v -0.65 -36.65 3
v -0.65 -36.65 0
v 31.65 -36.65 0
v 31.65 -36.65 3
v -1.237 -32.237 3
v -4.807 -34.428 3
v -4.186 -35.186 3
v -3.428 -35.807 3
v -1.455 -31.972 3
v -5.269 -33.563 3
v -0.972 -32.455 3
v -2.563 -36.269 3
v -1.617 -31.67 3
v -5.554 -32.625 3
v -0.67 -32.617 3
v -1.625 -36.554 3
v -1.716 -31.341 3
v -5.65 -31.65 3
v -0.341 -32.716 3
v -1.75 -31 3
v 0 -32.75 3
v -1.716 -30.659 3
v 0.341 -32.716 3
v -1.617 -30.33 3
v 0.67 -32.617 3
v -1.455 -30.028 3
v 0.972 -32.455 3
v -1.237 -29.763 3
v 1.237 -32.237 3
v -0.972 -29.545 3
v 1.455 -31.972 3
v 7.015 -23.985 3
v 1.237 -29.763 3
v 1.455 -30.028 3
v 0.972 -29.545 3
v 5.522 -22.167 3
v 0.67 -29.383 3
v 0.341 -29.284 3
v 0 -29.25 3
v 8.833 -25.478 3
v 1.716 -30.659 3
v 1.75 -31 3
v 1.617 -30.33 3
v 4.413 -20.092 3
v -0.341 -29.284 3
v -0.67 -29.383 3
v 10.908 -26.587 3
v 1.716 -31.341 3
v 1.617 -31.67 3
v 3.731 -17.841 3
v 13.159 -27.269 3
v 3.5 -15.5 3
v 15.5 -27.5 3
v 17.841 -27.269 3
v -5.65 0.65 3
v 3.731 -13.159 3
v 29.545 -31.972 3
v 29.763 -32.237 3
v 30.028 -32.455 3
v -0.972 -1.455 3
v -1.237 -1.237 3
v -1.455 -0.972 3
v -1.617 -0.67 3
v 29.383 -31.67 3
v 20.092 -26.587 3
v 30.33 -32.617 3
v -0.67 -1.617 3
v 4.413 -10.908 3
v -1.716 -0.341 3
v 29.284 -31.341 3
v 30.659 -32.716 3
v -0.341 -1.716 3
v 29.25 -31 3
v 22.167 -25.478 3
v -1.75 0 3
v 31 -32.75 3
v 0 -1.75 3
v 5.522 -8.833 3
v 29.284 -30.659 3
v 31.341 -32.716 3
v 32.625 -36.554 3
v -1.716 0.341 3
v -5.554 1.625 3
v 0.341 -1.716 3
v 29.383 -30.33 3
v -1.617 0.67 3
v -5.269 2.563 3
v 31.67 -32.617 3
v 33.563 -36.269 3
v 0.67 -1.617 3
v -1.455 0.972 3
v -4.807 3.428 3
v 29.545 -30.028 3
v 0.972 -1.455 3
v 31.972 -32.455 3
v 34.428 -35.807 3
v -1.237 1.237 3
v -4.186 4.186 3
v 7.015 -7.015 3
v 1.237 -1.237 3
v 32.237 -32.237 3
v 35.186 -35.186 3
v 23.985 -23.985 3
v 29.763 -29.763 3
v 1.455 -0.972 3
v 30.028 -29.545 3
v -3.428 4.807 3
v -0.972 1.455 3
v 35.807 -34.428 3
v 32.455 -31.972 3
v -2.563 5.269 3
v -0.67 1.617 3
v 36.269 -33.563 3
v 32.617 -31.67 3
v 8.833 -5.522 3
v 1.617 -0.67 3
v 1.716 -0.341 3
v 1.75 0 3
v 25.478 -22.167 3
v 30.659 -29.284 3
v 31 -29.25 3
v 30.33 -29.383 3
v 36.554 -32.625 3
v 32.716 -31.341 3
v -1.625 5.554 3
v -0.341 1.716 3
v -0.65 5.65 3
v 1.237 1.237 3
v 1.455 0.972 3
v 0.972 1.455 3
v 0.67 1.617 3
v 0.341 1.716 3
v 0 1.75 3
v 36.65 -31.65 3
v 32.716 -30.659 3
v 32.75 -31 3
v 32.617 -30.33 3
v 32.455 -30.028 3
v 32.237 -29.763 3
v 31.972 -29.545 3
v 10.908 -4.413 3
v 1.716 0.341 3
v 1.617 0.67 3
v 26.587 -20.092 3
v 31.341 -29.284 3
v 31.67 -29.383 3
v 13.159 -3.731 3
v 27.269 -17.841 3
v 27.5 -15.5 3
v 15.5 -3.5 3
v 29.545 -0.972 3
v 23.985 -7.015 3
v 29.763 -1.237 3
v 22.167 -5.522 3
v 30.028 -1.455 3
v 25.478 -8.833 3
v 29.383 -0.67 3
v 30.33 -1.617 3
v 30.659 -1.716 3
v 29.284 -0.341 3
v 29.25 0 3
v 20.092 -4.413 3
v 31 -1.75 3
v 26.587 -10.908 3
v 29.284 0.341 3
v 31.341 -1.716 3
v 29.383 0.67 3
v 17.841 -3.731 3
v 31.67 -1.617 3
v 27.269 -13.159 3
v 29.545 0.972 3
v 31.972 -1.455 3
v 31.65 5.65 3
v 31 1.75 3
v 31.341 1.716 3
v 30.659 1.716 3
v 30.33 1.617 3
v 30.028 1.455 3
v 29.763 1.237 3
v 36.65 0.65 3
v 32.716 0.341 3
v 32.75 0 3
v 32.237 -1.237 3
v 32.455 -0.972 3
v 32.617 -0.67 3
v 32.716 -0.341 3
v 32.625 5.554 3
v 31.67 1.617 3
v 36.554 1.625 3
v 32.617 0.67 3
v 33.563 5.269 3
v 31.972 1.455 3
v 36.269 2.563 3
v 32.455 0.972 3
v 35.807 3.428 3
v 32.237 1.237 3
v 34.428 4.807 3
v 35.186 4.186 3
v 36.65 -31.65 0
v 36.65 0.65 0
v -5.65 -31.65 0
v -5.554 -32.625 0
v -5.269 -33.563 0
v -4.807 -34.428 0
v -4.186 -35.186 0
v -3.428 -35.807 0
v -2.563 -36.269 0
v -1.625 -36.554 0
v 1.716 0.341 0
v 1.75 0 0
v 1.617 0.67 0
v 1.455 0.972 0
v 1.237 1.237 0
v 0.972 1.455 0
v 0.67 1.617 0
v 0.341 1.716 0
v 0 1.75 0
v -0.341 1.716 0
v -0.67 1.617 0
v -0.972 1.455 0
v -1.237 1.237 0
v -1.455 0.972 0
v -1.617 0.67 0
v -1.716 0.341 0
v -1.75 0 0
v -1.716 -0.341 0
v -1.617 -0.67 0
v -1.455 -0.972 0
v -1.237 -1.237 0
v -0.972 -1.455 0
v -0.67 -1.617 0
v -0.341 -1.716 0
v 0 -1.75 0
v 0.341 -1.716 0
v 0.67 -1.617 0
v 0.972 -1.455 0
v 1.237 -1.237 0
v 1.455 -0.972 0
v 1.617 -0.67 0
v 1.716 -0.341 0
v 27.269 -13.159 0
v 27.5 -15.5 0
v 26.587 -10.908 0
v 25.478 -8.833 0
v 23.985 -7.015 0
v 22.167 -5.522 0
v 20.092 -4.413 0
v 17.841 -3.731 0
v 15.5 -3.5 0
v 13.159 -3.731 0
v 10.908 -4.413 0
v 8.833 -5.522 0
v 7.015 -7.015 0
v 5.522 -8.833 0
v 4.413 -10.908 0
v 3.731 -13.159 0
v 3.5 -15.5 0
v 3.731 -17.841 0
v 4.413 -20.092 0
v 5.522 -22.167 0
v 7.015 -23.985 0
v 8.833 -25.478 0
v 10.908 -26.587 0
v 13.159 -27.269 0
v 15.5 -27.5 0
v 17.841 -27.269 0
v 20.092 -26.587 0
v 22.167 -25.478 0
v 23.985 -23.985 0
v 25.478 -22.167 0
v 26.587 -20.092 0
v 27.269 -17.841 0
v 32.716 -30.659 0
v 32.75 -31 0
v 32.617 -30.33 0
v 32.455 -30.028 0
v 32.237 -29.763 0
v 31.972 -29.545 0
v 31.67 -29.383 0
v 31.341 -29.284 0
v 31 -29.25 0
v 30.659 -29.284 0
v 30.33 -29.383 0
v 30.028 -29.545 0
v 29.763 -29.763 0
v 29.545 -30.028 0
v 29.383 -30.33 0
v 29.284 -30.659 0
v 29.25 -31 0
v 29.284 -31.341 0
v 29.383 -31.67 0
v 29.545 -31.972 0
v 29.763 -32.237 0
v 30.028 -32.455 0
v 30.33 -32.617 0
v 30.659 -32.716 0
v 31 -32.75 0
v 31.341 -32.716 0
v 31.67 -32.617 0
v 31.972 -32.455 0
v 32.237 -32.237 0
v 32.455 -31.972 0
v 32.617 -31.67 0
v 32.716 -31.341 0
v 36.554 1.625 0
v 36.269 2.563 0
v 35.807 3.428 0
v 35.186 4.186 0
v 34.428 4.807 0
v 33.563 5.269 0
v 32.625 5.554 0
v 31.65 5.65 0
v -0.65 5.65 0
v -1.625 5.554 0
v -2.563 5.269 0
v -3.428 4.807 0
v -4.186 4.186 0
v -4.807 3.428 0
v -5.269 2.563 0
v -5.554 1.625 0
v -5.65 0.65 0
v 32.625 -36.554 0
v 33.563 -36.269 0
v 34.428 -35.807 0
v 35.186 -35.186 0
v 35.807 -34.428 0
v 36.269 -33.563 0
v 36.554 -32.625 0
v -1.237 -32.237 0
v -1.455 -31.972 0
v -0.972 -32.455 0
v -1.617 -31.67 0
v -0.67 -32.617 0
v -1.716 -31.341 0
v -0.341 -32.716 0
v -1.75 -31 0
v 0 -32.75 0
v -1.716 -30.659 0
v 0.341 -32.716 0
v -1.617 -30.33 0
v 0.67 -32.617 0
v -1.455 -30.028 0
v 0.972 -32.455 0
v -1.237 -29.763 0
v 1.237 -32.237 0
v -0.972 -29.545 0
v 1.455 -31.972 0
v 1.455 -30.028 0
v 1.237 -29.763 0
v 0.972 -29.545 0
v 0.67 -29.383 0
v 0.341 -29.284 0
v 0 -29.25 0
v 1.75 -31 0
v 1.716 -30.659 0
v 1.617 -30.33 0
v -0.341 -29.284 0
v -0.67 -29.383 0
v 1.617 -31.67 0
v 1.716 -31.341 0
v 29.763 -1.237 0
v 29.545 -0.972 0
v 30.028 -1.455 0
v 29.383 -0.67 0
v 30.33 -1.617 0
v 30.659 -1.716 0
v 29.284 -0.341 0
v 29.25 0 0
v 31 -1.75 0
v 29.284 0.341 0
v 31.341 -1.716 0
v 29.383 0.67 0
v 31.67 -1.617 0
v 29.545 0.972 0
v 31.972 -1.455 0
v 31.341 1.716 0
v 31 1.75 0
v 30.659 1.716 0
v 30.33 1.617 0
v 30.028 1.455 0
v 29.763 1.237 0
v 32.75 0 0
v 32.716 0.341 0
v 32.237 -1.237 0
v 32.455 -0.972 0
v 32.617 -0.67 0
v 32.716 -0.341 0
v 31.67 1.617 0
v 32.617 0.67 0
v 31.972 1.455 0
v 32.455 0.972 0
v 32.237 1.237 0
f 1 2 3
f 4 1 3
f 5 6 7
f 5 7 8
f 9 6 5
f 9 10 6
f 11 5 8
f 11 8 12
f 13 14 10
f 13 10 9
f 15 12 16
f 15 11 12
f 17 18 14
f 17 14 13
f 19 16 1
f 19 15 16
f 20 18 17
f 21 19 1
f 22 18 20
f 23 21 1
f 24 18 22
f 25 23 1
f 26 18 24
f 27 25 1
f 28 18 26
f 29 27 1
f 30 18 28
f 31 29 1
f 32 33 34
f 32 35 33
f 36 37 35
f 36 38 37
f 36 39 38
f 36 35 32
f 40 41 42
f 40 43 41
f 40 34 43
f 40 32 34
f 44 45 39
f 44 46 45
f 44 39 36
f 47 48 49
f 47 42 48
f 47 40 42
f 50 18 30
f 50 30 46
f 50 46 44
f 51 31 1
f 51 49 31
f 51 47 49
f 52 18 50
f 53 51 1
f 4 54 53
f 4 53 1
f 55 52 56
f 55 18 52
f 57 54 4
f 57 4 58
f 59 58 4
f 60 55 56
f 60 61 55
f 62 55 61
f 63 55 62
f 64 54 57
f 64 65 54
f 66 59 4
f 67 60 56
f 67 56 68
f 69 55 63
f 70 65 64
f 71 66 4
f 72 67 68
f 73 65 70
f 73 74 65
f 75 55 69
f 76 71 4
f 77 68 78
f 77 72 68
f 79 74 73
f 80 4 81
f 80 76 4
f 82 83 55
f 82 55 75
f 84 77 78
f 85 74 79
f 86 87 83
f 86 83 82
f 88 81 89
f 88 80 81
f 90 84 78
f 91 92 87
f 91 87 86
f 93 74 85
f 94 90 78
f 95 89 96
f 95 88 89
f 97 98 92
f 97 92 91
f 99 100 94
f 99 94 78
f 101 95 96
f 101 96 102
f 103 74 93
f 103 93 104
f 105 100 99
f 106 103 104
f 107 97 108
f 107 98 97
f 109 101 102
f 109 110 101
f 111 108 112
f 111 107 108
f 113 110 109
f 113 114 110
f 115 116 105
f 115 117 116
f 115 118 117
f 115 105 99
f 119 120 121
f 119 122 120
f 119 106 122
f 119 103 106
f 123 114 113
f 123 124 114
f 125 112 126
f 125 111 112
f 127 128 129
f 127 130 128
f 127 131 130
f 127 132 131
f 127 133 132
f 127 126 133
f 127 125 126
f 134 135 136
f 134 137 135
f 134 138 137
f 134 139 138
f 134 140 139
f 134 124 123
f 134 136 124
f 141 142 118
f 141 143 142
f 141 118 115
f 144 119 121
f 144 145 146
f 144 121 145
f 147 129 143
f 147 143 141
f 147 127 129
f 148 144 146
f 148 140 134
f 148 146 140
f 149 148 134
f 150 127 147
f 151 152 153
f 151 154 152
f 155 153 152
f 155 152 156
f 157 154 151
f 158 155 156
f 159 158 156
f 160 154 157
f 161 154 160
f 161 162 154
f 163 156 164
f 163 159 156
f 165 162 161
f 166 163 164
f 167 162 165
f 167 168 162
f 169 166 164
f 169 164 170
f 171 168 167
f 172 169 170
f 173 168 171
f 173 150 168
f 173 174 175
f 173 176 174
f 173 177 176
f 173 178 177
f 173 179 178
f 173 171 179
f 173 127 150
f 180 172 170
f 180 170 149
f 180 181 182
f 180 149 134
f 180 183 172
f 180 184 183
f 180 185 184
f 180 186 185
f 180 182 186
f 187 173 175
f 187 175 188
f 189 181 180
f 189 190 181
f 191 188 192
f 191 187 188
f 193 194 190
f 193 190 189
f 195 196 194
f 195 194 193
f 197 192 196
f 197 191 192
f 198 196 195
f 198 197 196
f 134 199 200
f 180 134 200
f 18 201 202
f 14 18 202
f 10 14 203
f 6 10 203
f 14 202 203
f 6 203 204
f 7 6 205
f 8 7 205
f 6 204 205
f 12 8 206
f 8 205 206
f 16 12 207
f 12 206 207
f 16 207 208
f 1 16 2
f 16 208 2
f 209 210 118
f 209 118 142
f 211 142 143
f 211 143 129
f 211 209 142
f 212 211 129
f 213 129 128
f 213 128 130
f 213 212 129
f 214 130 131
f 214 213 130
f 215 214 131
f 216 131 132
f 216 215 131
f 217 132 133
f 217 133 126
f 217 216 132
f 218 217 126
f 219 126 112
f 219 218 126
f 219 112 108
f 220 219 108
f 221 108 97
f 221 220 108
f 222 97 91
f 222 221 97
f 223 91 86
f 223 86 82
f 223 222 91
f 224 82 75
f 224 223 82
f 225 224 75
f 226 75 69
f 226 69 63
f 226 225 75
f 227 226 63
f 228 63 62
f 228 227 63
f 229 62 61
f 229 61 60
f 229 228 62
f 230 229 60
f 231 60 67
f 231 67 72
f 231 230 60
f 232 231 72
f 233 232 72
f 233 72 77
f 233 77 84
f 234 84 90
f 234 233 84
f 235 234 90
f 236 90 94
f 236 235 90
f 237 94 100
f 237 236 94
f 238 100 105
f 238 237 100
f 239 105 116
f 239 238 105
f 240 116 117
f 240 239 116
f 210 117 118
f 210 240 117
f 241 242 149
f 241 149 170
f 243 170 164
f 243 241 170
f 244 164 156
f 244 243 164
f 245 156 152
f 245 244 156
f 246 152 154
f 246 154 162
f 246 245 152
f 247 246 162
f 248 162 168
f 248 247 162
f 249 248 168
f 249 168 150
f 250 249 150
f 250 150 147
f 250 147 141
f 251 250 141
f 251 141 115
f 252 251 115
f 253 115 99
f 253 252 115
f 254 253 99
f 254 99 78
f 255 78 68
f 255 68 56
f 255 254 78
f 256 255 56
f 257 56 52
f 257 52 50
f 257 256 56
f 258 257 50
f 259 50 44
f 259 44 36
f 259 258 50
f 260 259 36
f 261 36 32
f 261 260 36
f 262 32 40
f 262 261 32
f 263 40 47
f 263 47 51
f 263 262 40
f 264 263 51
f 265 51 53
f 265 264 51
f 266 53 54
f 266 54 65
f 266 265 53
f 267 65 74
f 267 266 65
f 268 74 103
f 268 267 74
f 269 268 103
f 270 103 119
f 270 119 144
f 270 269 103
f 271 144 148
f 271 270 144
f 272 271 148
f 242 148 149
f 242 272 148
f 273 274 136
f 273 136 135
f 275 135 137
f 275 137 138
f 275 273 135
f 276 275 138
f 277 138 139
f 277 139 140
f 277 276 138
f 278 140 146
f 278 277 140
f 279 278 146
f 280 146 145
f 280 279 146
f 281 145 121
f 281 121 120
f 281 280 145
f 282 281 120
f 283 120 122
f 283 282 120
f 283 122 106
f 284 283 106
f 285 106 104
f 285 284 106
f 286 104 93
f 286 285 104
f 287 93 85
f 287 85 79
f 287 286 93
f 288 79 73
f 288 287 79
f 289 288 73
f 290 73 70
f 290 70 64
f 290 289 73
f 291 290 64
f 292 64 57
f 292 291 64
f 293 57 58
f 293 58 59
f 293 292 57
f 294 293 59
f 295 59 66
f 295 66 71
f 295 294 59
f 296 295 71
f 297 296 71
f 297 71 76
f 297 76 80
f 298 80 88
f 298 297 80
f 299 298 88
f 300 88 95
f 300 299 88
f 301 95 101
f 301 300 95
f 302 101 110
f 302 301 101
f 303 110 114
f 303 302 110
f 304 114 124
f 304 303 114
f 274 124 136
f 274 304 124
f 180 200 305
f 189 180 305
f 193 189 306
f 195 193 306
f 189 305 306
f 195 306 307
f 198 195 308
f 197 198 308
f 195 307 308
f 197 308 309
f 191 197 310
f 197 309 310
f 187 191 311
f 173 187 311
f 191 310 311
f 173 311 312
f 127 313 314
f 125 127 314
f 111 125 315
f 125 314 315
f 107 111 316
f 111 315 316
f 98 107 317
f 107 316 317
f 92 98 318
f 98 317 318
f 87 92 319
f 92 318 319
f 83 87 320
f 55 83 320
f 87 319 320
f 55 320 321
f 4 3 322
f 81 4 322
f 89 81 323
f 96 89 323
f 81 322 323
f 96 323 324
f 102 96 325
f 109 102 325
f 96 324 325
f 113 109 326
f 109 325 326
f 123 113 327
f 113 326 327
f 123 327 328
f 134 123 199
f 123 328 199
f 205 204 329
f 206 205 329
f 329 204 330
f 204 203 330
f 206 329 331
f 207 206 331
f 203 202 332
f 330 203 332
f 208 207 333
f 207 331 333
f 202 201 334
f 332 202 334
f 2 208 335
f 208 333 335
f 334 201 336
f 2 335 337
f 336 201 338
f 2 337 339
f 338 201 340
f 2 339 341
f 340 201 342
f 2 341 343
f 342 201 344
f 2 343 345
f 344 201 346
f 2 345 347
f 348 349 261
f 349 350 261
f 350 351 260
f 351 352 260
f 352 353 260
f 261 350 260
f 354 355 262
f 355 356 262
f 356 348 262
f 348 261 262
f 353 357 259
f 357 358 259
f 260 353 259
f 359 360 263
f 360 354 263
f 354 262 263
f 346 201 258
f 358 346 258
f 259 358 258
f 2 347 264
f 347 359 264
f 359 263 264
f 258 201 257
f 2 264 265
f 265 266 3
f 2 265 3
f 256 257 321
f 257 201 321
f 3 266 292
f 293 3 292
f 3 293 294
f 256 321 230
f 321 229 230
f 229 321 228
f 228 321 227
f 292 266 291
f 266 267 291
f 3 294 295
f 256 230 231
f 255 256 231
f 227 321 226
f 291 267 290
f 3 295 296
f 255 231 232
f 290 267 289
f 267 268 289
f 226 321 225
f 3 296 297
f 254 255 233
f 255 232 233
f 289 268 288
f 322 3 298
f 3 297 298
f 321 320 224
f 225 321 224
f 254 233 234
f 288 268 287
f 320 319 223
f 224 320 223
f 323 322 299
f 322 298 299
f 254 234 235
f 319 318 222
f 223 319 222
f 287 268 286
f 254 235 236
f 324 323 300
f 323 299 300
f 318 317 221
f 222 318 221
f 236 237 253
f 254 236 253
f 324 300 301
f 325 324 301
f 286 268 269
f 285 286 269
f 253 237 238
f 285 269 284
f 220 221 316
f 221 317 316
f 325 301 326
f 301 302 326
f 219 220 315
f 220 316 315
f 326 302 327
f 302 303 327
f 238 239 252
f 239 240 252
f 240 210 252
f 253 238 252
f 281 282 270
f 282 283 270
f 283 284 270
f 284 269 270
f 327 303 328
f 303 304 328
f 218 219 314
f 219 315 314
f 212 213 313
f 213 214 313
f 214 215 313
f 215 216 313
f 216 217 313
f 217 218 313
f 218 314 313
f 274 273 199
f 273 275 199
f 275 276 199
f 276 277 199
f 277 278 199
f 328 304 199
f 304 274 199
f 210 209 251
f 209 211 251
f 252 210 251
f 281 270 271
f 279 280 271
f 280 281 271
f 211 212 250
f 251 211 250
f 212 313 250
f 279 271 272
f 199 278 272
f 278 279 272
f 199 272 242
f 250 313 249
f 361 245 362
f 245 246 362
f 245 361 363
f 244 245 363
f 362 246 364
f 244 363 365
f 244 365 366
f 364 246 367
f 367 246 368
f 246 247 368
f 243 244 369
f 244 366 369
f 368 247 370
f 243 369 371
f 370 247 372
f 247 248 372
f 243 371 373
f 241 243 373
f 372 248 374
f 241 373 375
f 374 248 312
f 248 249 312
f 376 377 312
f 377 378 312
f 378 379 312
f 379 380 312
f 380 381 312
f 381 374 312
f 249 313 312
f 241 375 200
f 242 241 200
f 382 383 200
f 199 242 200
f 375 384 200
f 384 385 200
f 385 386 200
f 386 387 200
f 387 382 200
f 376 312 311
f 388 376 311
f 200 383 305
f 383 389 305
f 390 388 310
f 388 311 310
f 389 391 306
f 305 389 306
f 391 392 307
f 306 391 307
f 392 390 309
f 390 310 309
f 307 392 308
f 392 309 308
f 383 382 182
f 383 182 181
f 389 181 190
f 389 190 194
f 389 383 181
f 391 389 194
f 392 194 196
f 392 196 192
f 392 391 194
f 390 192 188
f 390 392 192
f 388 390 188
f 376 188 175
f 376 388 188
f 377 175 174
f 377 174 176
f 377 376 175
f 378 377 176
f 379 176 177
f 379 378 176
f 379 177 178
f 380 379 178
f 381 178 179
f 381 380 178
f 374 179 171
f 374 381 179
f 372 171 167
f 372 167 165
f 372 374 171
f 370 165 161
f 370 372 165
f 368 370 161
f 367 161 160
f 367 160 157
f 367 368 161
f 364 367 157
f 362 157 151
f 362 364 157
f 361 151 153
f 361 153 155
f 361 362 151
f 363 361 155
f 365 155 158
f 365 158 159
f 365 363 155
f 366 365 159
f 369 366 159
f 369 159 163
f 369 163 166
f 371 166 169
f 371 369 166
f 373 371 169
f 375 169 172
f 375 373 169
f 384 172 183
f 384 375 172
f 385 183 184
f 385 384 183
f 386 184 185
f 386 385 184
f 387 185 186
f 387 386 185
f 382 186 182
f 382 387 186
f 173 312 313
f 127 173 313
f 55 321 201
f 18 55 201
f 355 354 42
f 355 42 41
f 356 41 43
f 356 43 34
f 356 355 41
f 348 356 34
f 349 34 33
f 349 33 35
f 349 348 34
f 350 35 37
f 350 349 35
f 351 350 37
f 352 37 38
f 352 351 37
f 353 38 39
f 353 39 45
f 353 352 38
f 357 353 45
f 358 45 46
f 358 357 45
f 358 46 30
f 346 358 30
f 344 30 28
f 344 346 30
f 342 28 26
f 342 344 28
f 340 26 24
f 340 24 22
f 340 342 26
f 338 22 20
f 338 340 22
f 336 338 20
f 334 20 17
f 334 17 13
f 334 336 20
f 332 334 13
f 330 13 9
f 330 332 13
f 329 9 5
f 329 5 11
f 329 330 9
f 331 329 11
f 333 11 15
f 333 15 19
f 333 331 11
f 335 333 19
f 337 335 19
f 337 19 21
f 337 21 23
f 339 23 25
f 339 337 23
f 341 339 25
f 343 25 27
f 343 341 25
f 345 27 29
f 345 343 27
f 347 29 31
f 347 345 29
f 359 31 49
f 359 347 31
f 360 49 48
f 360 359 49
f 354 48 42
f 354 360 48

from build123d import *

# Parameters (mm, degrees)
F0_R     = 1.75
F0_R_2   = 12
F1_DEPTH = 3


with BuildPart() as f1:
    # F0 (on Top) → F1 (new body)
    with BuildSketch(Plane.XY):
        with BuildLine():
            Line((31.65, 5.65), (-0.65, 5.65))
            ThreePointArc((-0.65, 5.65), (-4.185534, 4.185534), (-5.65, 0.65))
            Line((-5.65, 0.65), (-5.65, -31.65))
            ThreePointArc((-5.65, -31.65), (-4.185534, -35.185534), (-0.65, -36.65))
            Line((-0.65, -36.65), (31.65, -36.65))
            ThreePointArc((31.65, -36.65), (35.185534, -35.185534), (36.65, -31.65))
            Line((36.65, -31.65), (36.65, 0.65))
            ThreePointArc((36.65, 0.65), (35.185534, 4.185534), (31.65, 5.65))
        make_face()
        with Locations((0, -31)):
            Circle(F0_R, mode=Mode.SUBTRACT)
        with Locations((31, -31)):
            Circle(F0_R, mode=Mode.SUBTRACT)
        Circle(F0_R, mode=Mode.SUBTRACT)
        with Locations((15.5, -15.5)):
            Circle(F0_R_2, mode=Mode.SUBTRACT)
        with Locations((31, 0)):
            Circle(F0_R, mode=Mode.SUBTRACT)
    extrude(amount=F1_DEPTH)


solid = f1.part
